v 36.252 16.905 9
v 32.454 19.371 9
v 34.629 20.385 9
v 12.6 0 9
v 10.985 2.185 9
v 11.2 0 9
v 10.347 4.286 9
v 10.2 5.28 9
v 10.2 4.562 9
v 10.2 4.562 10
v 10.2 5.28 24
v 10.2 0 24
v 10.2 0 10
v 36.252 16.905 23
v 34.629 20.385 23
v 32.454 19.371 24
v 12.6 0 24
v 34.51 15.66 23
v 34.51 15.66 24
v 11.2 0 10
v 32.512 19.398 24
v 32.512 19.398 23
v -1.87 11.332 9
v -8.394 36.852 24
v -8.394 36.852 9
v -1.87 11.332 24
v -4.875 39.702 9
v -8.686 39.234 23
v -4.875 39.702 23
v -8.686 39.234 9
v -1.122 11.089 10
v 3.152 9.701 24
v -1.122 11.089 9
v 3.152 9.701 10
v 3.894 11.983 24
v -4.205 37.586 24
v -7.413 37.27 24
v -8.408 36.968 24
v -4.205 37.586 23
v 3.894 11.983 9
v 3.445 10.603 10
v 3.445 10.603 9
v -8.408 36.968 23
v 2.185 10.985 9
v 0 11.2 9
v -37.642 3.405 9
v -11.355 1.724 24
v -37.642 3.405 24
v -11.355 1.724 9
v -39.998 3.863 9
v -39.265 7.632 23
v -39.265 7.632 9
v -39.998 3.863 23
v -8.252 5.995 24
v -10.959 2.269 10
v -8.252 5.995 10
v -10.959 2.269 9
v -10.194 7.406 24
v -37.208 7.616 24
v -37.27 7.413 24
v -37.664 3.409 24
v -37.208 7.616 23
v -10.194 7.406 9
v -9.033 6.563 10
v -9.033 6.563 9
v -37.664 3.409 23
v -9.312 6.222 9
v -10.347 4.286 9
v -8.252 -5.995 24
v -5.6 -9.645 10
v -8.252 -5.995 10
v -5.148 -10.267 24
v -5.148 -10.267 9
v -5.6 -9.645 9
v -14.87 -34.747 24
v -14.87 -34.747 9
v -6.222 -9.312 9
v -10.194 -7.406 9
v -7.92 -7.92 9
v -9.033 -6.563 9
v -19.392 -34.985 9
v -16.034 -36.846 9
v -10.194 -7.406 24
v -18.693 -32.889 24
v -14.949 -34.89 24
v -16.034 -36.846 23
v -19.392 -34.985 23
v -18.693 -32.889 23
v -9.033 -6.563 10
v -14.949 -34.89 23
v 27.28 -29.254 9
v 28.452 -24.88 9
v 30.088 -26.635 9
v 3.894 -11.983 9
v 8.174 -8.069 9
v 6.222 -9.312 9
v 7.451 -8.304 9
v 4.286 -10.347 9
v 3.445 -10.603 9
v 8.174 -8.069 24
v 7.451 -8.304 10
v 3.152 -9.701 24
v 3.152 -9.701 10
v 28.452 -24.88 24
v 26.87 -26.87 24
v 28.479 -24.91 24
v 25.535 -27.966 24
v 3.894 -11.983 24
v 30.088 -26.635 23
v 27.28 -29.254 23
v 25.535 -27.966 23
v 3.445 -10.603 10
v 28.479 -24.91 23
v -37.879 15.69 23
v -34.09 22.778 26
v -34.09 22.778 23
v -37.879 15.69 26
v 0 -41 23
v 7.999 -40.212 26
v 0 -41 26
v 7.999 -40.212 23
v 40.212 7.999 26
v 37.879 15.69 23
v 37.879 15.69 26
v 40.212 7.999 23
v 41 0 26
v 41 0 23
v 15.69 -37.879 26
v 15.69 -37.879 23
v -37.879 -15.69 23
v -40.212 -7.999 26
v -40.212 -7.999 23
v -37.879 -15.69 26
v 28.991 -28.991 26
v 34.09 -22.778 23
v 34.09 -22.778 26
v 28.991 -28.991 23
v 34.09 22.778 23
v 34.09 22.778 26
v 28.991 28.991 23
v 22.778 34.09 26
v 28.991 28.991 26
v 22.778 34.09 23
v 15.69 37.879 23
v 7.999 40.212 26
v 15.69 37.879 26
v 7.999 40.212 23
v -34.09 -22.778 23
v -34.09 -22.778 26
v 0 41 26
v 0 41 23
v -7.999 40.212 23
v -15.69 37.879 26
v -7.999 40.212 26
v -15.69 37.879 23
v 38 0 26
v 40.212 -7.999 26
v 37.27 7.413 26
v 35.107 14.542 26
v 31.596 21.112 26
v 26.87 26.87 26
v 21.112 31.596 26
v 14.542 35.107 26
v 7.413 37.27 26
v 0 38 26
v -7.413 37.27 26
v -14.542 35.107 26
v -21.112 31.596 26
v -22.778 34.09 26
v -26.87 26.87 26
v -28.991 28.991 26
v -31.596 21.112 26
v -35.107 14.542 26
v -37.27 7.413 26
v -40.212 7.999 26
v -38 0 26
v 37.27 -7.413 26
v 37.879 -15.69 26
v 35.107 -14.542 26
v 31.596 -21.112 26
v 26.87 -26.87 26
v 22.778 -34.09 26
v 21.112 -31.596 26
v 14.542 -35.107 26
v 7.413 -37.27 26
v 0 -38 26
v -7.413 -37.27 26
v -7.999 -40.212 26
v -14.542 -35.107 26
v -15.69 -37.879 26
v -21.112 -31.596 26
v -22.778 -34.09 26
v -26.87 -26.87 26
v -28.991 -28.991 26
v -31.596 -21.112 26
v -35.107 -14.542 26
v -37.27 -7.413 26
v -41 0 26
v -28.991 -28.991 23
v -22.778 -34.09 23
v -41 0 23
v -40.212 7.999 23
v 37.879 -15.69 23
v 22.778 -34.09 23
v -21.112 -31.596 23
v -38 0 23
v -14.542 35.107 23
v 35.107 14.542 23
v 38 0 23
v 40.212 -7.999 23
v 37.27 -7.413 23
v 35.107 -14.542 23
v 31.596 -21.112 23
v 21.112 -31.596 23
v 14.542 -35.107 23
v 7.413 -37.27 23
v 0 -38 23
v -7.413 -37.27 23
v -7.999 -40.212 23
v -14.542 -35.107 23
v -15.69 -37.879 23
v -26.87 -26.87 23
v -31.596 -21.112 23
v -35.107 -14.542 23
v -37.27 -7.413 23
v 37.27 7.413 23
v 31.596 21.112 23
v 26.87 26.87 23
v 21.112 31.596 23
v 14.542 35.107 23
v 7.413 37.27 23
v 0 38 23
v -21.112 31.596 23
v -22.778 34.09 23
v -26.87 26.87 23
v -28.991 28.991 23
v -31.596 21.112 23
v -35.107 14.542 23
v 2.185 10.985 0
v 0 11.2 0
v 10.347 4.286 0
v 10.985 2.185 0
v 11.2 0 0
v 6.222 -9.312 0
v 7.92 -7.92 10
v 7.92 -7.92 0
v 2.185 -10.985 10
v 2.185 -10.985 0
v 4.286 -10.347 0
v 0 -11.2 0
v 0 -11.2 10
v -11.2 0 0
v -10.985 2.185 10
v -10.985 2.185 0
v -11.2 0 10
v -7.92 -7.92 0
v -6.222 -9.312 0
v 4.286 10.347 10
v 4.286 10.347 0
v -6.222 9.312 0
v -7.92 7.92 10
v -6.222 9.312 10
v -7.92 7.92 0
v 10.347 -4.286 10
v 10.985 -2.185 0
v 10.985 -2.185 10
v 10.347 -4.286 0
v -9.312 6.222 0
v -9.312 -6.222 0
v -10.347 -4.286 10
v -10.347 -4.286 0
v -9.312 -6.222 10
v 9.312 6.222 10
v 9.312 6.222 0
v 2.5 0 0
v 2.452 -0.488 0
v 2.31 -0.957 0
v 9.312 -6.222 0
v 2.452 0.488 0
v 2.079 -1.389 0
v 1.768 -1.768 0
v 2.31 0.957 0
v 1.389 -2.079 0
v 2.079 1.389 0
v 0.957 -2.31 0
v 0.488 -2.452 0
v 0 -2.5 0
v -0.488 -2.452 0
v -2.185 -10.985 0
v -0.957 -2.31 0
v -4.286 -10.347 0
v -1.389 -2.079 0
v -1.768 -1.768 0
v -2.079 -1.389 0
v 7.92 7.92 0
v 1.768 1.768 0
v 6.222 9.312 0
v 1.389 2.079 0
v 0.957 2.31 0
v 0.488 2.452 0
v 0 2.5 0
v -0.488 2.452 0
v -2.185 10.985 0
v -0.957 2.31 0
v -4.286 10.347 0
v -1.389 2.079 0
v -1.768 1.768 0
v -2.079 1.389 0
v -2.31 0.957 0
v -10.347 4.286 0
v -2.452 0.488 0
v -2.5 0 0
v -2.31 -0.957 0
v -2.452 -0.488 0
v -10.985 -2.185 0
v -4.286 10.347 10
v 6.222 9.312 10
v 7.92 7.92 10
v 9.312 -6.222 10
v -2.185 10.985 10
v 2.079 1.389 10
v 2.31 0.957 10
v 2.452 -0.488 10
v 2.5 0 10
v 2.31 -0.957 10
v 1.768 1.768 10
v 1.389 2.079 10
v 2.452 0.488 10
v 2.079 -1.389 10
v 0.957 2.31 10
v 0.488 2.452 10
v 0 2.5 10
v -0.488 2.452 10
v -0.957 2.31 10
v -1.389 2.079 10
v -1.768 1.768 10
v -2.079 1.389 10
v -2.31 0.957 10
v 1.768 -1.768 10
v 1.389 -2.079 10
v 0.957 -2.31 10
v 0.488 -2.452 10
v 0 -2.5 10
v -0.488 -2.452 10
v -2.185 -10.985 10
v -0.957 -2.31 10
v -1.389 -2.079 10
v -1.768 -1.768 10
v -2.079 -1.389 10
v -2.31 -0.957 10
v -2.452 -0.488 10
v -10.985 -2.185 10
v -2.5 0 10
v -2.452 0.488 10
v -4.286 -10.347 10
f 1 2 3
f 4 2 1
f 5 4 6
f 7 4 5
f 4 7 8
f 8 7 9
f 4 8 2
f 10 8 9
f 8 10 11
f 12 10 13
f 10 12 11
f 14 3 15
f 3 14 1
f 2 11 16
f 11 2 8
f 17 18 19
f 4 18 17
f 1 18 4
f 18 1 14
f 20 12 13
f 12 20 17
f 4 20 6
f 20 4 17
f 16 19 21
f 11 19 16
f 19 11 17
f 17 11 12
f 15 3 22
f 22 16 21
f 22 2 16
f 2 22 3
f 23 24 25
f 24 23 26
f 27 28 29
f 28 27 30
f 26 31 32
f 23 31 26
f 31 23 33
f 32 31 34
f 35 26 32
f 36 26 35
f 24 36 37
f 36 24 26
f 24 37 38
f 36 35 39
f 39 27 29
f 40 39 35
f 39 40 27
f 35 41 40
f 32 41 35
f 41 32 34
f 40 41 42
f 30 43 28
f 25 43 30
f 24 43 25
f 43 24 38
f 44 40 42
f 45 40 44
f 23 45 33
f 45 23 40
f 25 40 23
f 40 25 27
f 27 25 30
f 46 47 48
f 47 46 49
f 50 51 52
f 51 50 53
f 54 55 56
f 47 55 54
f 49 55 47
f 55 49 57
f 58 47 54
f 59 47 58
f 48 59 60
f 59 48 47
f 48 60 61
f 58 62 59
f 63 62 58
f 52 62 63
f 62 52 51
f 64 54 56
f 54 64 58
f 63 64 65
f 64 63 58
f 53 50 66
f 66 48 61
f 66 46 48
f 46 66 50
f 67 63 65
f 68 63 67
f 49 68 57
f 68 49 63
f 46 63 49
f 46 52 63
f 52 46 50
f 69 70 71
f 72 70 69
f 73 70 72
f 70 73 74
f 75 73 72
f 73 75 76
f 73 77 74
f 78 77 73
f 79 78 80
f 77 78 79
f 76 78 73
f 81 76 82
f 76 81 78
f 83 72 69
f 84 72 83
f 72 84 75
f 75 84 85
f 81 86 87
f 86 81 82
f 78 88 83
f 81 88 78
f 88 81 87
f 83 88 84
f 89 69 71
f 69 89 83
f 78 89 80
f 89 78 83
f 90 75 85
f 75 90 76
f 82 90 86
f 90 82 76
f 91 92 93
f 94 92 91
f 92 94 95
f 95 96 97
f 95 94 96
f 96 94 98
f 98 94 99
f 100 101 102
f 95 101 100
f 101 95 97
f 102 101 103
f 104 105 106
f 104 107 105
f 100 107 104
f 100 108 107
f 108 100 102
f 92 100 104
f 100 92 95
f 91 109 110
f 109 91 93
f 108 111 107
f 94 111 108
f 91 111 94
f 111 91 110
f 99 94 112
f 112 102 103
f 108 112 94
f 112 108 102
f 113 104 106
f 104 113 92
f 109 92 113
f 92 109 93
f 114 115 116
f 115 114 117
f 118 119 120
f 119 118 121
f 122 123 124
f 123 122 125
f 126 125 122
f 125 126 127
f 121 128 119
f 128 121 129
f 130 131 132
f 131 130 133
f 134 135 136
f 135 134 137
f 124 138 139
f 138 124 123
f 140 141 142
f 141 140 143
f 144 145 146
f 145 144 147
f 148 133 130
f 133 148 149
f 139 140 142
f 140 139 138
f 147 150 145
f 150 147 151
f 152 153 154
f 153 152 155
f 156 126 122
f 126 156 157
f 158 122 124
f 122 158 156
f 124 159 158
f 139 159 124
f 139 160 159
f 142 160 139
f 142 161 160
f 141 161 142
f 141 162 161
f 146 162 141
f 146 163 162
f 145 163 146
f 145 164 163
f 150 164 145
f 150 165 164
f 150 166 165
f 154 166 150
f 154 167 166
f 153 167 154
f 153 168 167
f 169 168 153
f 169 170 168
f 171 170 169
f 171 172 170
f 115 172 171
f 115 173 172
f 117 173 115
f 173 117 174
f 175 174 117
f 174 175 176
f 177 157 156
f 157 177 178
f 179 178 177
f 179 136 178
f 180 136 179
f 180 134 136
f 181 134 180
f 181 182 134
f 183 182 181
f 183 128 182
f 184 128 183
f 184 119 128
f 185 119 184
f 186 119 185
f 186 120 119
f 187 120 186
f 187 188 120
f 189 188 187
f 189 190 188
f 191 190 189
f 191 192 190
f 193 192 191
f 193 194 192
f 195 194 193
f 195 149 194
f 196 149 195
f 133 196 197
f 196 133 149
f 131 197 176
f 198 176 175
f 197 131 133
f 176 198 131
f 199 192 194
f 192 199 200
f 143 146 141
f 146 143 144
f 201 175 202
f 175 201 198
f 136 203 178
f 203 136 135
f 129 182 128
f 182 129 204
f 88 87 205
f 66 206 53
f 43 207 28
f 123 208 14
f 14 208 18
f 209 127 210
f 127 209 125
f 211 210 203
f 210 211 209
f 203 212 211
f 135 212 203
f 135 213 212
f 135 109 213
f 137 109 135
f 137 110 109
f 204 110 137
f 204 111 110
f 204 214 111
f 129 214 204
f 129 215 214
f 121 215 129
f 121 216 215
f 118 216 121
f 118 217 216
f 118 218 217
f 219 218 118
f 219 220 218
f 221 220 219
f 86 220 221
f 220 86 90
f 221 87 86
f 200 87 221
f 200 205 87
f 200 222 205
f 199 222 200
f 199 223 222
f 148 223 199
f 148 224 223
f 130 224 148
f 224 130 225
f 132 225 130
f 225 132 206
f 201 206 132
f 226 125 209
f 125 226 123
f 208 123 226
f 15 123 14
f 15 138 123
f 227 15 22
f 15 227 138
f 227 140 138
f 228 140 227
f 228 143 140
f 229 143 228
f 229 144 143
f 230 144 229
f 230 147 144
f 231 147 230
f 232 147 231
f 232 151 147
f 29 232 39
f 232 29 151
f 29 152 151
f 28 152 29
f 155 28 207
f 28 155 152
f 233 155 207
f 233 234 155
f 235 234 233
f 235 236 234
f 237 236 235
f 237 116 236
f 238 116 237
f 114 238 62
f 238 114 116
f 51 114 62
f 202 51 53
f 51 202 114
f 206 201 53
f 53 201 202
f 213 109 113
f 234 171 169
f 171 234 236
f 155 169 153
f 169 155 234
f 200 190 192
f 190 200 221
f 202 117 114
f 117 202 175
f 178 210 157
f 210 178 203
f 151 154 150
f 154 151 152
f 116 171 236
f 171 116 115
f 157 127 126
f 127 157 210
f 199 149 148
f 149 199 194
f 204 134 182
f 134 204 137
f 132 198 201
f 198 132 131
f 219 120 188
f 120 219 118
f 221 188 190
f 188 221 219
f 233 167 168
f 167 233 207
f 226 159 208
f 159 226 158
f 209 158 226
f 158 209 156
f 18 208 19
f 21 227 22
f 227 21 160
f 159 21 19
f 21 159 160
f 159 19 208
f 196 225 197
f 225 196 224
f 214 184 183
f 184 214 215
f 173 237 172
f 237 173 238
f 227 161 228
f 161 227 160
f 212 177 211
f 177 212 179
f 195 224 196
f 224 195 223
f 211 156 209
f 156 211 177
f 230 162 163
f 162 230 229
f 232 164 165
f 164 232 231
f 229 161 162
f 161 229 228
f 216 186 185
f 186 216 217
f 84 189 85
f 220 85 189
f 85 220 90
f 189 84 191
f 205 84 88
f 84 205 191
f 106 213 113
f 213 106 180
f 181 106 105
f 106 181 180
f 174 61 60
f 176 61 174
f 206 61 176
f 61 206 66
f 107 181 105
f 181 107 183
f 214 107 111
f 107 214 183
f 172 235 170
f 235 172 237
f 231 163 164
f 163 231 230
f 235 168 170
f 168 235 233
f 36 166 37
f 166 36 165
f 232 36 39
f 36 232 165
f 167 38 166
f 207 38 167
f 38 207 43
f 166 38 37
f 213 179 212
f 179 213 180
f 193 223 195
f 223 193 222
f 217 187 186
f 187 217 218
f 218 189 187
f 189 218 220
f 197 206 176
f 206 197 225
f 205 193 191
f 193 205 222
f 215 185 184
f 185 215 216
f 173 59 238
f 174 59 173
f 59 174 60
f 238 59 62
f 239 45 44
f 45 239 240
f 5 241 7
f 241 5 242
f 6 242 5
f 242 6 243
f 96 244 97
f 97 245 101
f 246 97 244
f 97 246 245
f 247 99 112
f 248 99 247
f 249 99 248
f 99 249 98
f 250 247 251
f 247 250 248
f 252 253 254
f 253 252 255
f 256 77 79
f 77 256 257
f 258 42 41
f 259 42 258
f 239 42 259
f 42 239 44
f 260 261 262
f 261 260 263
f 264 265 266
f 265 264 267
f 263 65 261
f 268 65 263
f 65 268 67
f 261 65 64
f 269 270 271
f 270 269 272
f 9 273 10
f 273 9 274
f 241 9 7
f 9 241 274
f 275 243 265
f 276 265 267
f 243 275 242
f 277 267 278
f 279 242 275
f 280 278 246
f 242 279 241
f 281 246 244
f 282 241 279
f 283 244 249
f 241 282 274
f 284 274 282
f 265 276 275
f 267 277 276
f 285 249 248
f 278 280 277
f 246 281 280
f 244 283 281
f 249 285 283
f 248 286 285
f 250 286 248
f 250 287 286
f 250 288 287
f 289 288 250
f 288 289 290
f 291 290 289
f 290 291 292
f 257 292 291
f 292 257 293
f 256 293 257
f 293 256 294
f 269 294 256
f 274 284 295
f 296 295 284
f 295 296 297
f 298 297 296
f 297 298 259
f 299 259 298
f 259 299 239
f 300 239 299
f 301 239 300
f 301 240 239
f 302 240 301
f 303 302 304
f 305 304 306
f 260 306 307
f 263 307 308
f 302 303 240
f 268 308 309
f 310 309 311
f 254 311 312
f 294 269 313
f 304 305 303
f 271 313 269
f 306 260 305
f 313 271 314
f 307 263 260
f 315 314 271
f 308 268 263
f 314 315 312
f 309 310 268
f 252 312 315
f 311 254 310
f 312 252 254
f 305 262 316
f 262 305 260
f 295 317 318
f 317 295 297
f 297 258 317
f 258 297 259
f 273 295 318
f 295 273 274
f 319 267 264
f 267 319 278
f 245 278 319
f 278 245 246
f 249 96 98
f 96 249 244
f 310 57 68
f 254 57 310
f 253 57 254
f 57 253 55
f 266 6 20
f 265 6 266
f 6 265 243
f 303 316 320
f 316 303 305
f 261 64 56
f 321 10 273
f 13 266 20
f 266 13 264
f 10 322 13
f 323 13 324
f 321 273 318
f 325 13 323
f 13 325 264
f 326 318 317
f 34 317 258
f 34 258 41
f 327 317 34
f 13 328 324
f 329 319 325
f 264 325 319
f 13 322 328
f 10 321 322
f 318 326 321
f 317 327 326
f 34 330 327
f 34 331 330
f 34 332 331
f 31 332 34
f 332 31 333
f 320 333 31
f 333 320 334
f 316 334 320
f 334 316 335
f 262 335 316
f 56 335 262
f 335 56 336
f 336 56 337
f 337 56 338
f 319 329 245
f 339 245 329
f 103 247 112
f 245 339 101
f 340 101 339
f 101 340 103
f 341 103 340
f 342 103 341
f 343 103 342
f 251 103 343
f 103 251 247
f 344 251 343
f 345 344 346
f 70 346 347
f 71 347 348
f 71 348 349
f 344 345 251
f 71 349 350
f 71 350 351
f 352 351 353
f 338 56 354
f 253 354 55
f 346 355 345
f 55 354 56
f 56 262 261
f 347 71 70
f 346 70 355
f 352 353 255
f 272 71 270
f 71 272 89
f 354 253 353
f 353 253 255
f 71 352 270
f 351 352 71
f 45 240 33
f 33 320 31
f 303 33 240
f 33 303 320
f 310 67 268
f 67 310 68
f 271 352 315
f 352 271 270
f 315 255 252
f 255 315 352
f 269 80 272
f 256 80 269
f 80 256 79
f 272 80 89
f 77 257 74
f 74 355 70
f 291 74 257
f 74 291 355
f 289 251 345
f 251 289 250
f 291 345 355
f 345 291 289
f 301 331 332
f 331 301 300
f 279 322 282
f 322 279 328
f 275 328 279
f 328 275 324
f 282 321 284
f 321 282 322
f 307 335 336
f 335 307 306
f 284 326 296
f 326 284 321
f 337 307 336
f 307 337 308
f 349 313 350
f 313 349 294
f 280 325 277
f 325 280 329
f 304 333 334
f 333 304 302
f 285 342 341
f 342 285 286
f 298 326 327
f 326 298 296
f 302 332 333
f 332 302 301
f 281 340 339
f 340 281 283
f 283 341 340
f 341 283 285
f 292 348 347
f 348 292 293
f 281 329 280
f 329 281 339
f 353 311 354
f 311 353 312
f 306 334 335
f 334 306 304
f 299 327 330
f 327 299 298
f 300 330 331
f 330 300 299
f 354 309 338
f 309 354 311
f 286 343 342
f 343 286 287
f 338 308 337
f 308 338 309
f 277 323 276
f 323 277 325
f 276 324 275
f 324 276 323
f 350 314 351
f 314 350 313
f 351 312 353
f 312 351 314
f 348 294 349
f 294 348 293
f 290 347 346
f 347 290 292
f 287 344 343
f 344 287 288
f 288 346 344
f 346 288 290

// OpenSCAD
$fn = 32;

// ----------------------------------------------------------------------
// Impeller: 80 mm, 5 blades, 26 mm tall
// ----------------------------------------------------------------------

// --- parameters (mm) ---
boss_d = 22.4;            // hub diameter
boss_h = 10;              // hub height
rotor_d = 80;             // outer diameter over the blades
vane_count = 5;           // number of blades
blade_t = 2.4;            // blade thickness
blade_h = 14;             // blade height
blade_in_r = 10.2;        // blade root radius
blade_out_r = 37.6;       // blade tip radius
sweep = 25;               // blade sweep, degrees
bore_d = 5;               // shaft bore
shroud_h = 2;             // shroud ring thickness
shroud_d = 82;            // shroud outside diameter

module hub() {
  cylinder(h = boss_h, d = boss_d);
}

module blade() {
  /* blade swept between two boxes: hull of the root and the tip section */
  hull() {
    translate([blade_in_r, 0, boss_h - 1])
      cube([blade_t, blade_t * 2.2, blade_h + 1], center = false);
    rotate([0, 0, sweep])
      translate([blade_out_r, 0, boss_h - 1])
        cube([blade_t, blade_t * 1.6, blade_h + 1], center = false);
  }
}

module blades() {
  for (i = [0 : vane_count - 1])
    rotate([0, 0, i * 360 / vane_count]) blade();
}

module shroud() {
  translate([0, 0, boss_h + blade_h - 1])
    difference() {
      cylinder(h = shroud_h + 1, d = shroud_d);
      translate([0, 0, -1]) cylinder(h = shroud_h + 3, d = shroud_d - 2 * 3);
    }
}

difference() {
  union() {
    hub();
    blades();
    shroud();
  }
  translate([0, 0, -1]) cylinder(h = boss_h + blade_h + shroud_h + 3, d = bore_d);
}
